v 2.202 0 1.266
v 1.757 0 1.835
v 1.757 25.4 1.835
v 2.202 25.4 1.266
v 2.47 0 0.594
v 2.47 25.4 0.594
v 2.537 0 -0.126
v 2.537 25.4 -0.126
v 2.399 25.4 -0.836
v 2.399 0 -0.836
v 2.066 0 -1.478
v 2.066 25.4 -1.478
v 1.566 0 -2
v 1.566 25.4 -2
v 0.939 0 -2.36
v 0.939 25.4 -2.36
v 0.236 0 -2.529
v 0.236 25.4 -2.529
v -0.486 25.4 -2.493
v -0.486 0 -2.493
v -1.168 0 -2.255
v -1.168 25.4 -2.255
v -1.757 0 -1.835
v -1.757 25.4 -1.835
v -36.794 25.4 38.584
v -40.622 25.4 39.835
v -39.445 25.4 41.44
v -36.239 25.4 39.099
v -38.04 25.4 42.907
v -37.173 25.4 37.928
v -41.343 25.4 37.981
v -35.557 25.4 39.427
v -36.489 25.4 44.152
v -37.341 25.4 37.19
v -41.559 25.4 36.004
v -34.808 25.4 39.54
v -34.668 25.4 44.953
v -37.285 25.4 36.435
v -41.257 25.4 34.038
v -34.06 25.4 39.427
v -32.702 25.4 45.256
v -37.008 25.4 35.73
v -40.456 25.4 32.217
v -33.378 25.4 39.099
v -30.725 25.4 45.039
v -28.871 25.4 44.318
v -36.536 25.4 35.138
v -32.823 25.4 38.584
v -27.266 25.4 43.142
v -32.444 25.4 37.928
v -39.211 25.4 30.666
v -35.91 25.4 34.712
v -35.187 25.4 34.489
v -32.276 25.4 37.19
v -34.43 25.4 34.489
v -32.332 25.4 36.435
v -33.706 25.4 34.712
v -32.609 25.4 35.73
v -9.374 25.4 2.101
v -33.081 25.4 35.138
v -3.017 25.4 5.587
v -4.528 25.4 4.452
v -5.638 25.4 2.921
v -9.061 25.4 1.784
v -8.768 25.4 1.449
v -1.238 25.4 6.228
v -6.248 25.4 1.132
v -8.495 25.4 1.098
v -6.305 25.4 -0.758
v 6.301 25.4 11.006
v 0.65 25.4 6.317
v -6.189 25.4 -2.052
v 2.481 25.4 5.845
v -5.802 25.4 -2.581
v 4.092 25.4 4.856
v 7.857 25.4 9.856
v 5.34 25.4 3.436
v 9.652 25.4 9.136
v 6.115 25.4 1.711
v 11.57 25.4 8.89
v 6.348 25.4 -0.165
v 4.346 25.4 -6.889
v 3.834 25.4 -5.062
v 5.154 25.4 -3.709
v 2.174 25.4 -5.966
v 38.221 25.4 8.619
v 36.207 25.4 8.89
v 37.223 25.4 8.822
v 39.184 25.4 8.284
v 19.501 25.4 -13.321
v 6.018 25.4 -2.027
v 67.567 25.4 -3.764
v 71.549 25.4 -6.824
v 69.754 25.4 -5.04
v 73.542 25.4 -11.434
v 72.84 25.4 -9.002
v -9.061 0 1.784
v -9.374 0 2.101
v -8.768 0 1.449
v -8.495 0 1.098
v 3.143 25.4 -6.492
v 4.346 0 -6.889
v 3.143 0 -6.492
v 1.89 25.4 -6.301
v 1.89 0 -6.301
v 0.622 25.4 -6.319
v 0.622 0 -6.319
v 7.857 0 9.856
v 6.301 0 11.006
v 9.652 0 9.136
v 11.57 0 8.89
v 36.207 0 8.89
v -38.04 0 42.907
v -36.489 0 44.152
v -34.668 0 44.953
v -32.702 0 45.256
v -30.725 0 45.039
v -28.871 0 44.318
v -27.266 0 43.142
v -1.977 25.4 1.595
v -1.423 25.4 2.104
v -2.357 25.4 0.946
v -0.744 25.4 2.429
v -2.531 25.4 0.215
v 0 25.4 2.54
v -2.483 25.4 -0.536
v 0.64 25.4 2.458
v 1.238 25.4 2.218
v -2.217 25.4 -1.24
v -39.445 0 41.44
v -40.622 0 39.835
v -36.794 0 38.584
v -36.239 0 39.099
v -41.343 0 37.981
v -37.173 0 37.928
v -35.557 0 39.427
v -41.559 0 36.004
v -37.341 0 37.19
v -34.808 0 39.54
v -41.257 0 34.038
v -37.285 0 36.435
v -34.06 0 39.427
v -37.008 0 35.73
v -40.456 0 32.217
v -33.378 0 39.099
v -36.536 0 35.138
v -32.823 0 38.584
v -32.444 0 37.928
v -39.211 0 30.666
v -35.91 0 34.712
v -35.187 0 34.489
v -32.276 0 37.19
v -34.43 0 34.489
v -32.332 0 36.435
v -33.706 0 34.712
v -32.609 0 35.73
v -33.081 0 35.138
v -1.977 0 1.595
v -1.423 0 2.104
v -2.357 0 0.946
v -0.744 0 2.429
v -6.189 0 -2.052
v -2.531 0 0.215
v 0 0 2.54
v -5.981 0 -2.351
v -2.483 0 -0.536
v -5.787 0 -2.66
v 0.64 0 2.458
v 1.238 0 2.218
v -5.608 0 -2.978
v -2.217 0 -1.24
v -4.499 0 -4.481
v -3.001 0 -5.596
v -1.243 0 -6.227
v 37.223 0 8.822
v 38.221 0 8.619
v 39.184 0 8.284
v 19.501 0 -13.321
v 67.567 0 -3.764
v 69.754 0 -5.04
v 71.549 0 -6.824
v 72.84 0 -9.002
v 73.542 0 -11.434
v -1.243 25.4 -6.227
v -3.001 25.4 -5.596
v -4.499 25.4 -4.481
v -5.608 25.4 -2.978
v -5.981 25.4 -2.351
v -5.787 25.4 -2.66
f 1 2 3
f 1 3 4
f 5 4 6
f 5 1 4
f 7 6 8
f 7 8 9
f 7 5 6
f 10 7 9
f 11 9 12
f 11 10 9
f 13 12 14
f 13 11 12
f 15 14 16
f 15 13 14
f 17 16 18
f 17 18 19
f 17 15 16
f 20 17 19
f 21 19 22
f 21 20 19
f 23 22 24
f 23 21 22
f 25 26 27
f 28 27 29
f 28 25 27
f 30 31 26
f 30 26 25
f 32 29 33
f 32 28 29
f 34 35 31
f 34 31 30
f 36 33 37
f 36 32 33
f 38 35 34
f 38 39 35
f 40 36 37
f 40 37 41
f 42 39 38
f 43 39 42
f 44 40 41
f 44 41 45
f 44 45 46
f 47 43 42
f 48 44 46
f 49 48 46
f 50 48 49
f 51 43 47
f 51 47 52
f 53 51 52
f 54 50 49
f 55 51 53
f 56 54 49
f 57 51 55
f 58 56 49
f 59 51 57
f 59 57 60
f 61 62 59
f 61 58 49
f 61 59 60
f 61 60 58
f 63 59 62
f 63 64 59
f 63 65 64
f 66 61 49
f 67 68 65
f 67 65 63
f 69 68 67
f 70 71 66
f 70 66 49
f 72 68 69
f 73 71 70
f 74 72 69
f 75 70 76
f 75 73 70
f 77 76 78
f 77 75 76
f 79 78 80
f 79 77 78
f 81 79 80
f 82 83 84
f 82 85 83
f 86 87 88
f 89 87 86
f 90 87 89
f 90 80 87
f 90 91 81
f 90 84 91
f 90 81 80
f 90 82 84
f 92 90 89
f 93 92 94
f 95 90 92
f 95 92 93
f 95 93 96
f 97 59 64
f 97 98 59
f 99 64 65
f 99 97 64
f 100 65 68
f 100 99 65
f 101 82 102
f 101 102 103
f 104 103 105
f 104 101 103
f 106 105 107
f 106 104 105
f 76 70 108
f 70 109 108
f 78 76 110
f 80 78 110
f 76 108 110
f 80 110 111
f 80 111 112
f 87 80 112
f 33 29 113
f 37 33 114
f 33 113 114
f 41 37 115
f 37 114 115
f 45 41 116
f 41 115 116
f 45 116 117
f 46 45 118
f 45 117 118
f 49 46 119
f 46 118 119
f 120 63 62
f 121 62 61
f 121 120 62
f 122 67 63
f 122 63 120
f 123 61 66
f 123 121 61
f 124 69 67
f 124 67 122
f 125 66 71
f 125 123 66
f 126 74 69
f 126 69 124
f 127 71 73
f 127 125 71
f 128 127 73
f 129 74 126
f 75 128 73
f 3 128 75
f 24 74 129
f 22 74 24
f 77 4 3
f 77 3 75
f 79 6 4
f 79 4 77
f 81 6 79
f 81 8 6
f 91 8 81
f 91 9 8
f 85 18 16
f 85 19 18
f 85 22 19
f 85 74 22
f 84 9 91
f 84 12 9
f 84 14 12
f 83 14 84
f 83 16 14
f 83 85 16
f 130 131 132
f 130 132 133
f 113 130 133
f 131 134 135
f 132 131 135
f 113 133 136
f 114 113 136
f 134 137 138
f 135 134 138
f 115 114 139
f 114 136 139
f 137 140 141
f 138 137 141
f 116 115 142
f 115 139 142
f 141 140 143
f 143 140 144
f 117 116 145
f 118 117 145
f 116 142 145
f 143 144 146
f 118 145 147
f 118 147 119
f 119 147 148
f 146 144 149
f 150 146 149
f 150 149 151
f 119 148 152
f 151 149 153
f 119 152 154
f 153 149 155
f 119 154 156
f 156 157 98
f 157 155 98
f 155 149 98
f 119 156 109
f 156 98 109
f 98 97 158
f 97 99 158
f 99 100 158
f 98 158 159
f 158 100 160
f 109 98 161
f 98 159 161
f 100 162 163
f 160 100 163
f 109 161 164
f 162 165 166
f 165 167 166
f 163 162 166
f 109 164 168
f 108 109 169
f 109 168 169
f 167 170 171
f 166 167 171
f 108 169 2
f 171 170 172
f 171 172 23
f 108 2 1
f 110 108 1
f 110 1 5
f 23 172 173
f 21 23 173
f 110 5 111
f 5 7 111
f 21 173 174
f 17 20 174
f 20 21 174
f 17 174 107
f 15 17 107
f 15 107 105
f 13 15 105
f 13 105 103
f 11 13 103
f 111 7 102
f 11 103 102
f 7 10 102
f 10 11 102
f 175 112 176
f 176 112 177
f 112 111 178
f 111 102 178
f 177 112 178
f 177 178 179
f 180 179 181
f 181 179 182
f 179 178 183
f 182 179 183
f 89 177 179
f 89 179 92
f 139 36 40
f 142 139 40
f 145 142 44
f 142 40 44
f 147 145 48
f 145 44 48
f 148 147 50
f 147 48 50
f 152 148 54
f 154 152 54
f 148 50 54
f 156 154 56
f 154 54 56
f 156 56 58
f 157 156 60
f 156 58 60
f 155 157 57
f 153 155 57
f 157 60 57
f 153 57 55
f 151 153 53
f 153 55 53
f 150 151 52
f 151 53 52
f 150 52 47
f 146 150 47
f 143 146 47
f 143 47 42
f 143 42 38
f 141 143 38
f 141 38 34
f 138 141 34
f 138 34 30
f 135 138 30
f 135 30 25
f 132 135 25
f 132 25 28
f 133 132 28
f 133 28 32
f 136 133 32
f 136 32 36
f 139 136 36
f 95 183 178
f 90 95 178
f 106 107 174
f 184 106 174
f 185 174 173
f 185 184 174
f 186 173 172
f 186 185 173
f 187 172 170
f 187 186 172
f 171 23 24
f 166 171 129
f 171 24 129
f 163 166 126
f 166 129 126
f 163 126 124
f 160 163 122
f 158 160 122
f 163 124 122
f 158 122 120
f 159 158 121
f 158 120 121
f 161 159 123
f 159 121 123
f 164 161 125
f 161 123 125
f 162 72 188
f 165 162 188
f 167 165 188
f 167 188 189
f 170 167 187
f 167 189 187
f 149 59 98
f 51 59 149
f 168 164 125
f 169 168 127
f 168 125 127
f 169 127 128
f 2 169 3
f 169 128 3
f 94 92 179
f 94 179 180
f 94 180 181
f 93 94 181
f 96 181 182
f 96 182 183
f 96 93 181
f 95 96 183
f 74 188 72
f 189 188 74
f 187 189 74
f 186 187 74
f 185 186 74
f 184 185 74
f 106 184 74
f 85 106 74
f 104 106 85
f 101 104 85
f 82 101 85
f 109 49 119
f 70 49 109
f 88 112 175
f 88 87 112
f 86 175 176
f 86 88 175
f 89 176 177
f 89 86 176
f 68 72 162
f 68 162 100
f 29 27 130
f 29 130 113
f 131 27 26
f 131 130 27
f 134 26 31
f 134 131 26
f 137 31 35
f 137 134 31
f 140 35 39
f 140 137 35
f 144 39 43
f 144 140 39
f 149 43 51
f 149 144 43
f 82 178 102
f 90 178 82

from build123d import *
from OCP.BRepFilletAPI import BRepFilletAPI_MakeChamfer

# Parameters (mm, degrees)
SKETCH1_W           = 82.55
SKETCH1_H           = 25.4
SKETCH1_R           = 2.54
BOSS_EXTRUDE1_DEPTH = 25.4
CHAMFER1_SIZE       = 15.24
CHAMFER1_SIZE2      = 35.903190055
FILLET1_R           = 10
CHAMFER2_SIZE       = 5.08
CHAMFER2_SIZE_2     = 145.472166677
BOSS_EXTRUDE2_DEPTH = 25.4
SKETCH3_R           = 2.54
CUT_EXTRUDE1_DEPTH  = 92.63619095
SKETCH4_R           = 2.54
CUT_EXTRUDE2_DEPTH  = 92.63619095
FILLET3_R           = 7.62
FILLET4_R           = 7.62
SKETCH5_R           = 6.35
SKETCH5_R_2         = 2.54
BOSS_EXTRUDE3_DEPTH = 25.4
FILLET5_R           = 7.62
CUT_EXTRUDE3_DEPTH  = 91.009898604
FILLET6_R           = 7.62


with BuildPart() as part:
    # Sketch1 → Boss-Extrude1 (new body)
    with BuildSketch(Plane(origin=(0, 0, 0), x_dir=(1, 0, 0), z_dir=(0, 1, 0))):
        with Locations((32.385, 3.81)):
            Rectangle(SKETCH1_W, SKETCH1_H)
        with Locations(Location((0, 0, 0), (0, 0, 270))):
            Circle(SKETCH1_R, mode=Mode.SUBTRACT)
    extrude(amount=BOSS_EXTRUDE1_DEPTH)

    # Chamfer1: one chamfer whose edges measure the first distance from different faces: ONE call of the kernel's chamfer builder (chamfer() names one face for all edges)
    chamfer1_edges_1 = [part.edges().sort_by_distance(p)[0] for p in [
        (-8.89, 12.7, -16.51),
    ]]
    chamfer1_side_1 = [part.faces().sort_by_distance(p)[0] for p in [
        (-8.89, 12.7, -3.81),
    ]]
    chamfer1_edges_2 = [part.edges().sort_by_distance(p)[0] for p in [
        (73.66, 12.7, 8.89),
    ]]
    chamfer1_side_2 = [part.faces().sort_by_distance(p)[0] for p in [
        (73.66, 12.7, -3.81),
    ]]
    chamfer1 = BRepFilletAPI_MakeChamfer(part.part.solid().wrapped)
    for e in chamfer1_edges_1:
        chamfer1.Add(CHAMFER1_SIZE, CHAMFER1_SIZE2, e.wrapped, chamfer1_side_1[0].wrapped)  # the first distance lies on this face
    for e in chamfer1_edges_2:
        chamfer1.Add(CHAMFER1_SIZE, CHAMFER1_SIZE2, e.wrapped, chamfer1_side_2[0].wrapped)  # the first distance lies on this face
    add(Compound.cast(chamfer1.Shape()), mode=Mode.REPLACE)

    # Fillet1
    fillet1_edges = [part.edges().sort_by_distance(p)[0] for p in [
        (73.66, 12.7, -6.35),
    ]]
    fillet(fillet1_edges, radius=FILLET1_R)

    # Chamfer2
    # the kernel refuses this chamfer: 145.472166677, 5.08 mm, written as the material it takes off along each edge
    with BuildSketch(Plane(origin=(73.66, -378.219112331, -16.51), x_dir=(0.7401679873250444, 0, 0.6724220033127953), z_dir=(0, 1, 0))) as chamfer2_piece_1:
        Polygon((CHAMFER2_SIZE * 0.672422003313, -CHAMFER2_SIZE * 0.740167987325), (-CHAMFER2_SIZE_2 * 0.740167987326, -CHAMFER2_SIZE_2 * 0.672422003314), (0, 0), align=None)
    extrude(amount=781.838224662, mode=Mode.SUBTRACT)

    # Sketch2 → Boss-Extrude2 (add)
    with BuildSketch(Plane(origin=(0, 25.4, 0), x_dir=(1, 0, 0), z_dir=(0, 1, 0))):
        Polygon((-3.433319289, 3.586223542), (-44.714941303, -35.935291914), (-32.770661076, -48.411515456), (8.510960938, -8.89), align=None)
    extrude(amount=-BOSS_EXTRUDE2_DEPTH)

    # Sketch3 → Cut-Extrude1 (cut, through all)
    with BuildSketch(Plane(origin=(0, 25.4, 0), x_dir=(1, 0, 0), z_dir=(0, 1, 0))):
        with Locations(Location((0, 0, 0), (0, 0, 270))):
            Circle(SKETCH3_R)
    extrude(amount=-CUT_EXTRUDE1_DEPTH, mode=Mode.SUBTRACT)

    # Sketch4 → Cut-Extrude2 (cut, through all)
    with BuildSketch(Plane(origin=(0, 25.4, 0), x_dir=(1, 0, 0), z_dir=(0, 1, 0))):
        with Locations(Location((-34.808399123, -37.000207438, 0), (0, 0, 270))):
            Circle(SKETCH4_R)
    extrude(amount=-CUT_EXTRUDE2_DEPTH, mode=Mode.SUBTRACT)

    # Fillet3
    fillet3_edges = [part.edges().sort_by_distance(p)[0] for p in [
        (-44.714941303, 12.7, 35.935291914),
        (-32.770661076, 12.7, 48.411515456),
    ]]
    fillet(fillet3_edges, radius=FILLET3_R)

    # Fillet4
    fillet4_edges = [part.edges().sort_by_distance(p)[0] for p in [
        (37.756809945, 12.7, 8.89),
        (8.510960938, 12.7, 8.89),
    ]]
    fillet(fillet4_edges, radius=FILLET4_R)

    # Sketch5 → Boss-Extrude3 (add)
    with BuildSketch(Plane(origin=(0, 25.4, 0), x_dir=(1, 0, 0), z_dir=(0, 1, 0))):
        Circle(SKETCH5_R)
        with Locations(Location((0, 0, 0), (0, 0, 270))):
            Circle(SKETCH5_R_2, mode=Mode.SUBTRACT)
    extrude(amount=-BOSS_EXTRUDE3_DEPTH)

    # Fillet5
    fillet5_edges = [part.edges().sort_by_distance(p)[0] for p in [
        (2.173832351, 12.7, -5.966318204),
    ]]
    fillet(fillet5_edges, radius=FILLET5_R)

    # Sketch6 → Cut-Extrude3 (cut, through all)
    with BuildSketch(Plane(origin=(0, 25.4, 0), x_dir=(1, 0, 0), z_dir=(0, 1, 0))):
        Polygon((-5.801880984, 2.580828752), (-8.89, -1.637803048), (-8.89, 1.27), align=None)
    extrude(amount=-CUT_EXTRUDE3_DEPTH, mode=Mode.SUBTRACT)

    # Fillet6
    fillet6_edges = [part.edges().sort_by_distance(p)[0] for p in [
        (-5.801880984, 12.7, -2.580828752),
        (-8.89, 12.7, 1.637803048),
    ]]
    fillet(fillet6_edges, radius=FILLET6_R)


solid = part.part
